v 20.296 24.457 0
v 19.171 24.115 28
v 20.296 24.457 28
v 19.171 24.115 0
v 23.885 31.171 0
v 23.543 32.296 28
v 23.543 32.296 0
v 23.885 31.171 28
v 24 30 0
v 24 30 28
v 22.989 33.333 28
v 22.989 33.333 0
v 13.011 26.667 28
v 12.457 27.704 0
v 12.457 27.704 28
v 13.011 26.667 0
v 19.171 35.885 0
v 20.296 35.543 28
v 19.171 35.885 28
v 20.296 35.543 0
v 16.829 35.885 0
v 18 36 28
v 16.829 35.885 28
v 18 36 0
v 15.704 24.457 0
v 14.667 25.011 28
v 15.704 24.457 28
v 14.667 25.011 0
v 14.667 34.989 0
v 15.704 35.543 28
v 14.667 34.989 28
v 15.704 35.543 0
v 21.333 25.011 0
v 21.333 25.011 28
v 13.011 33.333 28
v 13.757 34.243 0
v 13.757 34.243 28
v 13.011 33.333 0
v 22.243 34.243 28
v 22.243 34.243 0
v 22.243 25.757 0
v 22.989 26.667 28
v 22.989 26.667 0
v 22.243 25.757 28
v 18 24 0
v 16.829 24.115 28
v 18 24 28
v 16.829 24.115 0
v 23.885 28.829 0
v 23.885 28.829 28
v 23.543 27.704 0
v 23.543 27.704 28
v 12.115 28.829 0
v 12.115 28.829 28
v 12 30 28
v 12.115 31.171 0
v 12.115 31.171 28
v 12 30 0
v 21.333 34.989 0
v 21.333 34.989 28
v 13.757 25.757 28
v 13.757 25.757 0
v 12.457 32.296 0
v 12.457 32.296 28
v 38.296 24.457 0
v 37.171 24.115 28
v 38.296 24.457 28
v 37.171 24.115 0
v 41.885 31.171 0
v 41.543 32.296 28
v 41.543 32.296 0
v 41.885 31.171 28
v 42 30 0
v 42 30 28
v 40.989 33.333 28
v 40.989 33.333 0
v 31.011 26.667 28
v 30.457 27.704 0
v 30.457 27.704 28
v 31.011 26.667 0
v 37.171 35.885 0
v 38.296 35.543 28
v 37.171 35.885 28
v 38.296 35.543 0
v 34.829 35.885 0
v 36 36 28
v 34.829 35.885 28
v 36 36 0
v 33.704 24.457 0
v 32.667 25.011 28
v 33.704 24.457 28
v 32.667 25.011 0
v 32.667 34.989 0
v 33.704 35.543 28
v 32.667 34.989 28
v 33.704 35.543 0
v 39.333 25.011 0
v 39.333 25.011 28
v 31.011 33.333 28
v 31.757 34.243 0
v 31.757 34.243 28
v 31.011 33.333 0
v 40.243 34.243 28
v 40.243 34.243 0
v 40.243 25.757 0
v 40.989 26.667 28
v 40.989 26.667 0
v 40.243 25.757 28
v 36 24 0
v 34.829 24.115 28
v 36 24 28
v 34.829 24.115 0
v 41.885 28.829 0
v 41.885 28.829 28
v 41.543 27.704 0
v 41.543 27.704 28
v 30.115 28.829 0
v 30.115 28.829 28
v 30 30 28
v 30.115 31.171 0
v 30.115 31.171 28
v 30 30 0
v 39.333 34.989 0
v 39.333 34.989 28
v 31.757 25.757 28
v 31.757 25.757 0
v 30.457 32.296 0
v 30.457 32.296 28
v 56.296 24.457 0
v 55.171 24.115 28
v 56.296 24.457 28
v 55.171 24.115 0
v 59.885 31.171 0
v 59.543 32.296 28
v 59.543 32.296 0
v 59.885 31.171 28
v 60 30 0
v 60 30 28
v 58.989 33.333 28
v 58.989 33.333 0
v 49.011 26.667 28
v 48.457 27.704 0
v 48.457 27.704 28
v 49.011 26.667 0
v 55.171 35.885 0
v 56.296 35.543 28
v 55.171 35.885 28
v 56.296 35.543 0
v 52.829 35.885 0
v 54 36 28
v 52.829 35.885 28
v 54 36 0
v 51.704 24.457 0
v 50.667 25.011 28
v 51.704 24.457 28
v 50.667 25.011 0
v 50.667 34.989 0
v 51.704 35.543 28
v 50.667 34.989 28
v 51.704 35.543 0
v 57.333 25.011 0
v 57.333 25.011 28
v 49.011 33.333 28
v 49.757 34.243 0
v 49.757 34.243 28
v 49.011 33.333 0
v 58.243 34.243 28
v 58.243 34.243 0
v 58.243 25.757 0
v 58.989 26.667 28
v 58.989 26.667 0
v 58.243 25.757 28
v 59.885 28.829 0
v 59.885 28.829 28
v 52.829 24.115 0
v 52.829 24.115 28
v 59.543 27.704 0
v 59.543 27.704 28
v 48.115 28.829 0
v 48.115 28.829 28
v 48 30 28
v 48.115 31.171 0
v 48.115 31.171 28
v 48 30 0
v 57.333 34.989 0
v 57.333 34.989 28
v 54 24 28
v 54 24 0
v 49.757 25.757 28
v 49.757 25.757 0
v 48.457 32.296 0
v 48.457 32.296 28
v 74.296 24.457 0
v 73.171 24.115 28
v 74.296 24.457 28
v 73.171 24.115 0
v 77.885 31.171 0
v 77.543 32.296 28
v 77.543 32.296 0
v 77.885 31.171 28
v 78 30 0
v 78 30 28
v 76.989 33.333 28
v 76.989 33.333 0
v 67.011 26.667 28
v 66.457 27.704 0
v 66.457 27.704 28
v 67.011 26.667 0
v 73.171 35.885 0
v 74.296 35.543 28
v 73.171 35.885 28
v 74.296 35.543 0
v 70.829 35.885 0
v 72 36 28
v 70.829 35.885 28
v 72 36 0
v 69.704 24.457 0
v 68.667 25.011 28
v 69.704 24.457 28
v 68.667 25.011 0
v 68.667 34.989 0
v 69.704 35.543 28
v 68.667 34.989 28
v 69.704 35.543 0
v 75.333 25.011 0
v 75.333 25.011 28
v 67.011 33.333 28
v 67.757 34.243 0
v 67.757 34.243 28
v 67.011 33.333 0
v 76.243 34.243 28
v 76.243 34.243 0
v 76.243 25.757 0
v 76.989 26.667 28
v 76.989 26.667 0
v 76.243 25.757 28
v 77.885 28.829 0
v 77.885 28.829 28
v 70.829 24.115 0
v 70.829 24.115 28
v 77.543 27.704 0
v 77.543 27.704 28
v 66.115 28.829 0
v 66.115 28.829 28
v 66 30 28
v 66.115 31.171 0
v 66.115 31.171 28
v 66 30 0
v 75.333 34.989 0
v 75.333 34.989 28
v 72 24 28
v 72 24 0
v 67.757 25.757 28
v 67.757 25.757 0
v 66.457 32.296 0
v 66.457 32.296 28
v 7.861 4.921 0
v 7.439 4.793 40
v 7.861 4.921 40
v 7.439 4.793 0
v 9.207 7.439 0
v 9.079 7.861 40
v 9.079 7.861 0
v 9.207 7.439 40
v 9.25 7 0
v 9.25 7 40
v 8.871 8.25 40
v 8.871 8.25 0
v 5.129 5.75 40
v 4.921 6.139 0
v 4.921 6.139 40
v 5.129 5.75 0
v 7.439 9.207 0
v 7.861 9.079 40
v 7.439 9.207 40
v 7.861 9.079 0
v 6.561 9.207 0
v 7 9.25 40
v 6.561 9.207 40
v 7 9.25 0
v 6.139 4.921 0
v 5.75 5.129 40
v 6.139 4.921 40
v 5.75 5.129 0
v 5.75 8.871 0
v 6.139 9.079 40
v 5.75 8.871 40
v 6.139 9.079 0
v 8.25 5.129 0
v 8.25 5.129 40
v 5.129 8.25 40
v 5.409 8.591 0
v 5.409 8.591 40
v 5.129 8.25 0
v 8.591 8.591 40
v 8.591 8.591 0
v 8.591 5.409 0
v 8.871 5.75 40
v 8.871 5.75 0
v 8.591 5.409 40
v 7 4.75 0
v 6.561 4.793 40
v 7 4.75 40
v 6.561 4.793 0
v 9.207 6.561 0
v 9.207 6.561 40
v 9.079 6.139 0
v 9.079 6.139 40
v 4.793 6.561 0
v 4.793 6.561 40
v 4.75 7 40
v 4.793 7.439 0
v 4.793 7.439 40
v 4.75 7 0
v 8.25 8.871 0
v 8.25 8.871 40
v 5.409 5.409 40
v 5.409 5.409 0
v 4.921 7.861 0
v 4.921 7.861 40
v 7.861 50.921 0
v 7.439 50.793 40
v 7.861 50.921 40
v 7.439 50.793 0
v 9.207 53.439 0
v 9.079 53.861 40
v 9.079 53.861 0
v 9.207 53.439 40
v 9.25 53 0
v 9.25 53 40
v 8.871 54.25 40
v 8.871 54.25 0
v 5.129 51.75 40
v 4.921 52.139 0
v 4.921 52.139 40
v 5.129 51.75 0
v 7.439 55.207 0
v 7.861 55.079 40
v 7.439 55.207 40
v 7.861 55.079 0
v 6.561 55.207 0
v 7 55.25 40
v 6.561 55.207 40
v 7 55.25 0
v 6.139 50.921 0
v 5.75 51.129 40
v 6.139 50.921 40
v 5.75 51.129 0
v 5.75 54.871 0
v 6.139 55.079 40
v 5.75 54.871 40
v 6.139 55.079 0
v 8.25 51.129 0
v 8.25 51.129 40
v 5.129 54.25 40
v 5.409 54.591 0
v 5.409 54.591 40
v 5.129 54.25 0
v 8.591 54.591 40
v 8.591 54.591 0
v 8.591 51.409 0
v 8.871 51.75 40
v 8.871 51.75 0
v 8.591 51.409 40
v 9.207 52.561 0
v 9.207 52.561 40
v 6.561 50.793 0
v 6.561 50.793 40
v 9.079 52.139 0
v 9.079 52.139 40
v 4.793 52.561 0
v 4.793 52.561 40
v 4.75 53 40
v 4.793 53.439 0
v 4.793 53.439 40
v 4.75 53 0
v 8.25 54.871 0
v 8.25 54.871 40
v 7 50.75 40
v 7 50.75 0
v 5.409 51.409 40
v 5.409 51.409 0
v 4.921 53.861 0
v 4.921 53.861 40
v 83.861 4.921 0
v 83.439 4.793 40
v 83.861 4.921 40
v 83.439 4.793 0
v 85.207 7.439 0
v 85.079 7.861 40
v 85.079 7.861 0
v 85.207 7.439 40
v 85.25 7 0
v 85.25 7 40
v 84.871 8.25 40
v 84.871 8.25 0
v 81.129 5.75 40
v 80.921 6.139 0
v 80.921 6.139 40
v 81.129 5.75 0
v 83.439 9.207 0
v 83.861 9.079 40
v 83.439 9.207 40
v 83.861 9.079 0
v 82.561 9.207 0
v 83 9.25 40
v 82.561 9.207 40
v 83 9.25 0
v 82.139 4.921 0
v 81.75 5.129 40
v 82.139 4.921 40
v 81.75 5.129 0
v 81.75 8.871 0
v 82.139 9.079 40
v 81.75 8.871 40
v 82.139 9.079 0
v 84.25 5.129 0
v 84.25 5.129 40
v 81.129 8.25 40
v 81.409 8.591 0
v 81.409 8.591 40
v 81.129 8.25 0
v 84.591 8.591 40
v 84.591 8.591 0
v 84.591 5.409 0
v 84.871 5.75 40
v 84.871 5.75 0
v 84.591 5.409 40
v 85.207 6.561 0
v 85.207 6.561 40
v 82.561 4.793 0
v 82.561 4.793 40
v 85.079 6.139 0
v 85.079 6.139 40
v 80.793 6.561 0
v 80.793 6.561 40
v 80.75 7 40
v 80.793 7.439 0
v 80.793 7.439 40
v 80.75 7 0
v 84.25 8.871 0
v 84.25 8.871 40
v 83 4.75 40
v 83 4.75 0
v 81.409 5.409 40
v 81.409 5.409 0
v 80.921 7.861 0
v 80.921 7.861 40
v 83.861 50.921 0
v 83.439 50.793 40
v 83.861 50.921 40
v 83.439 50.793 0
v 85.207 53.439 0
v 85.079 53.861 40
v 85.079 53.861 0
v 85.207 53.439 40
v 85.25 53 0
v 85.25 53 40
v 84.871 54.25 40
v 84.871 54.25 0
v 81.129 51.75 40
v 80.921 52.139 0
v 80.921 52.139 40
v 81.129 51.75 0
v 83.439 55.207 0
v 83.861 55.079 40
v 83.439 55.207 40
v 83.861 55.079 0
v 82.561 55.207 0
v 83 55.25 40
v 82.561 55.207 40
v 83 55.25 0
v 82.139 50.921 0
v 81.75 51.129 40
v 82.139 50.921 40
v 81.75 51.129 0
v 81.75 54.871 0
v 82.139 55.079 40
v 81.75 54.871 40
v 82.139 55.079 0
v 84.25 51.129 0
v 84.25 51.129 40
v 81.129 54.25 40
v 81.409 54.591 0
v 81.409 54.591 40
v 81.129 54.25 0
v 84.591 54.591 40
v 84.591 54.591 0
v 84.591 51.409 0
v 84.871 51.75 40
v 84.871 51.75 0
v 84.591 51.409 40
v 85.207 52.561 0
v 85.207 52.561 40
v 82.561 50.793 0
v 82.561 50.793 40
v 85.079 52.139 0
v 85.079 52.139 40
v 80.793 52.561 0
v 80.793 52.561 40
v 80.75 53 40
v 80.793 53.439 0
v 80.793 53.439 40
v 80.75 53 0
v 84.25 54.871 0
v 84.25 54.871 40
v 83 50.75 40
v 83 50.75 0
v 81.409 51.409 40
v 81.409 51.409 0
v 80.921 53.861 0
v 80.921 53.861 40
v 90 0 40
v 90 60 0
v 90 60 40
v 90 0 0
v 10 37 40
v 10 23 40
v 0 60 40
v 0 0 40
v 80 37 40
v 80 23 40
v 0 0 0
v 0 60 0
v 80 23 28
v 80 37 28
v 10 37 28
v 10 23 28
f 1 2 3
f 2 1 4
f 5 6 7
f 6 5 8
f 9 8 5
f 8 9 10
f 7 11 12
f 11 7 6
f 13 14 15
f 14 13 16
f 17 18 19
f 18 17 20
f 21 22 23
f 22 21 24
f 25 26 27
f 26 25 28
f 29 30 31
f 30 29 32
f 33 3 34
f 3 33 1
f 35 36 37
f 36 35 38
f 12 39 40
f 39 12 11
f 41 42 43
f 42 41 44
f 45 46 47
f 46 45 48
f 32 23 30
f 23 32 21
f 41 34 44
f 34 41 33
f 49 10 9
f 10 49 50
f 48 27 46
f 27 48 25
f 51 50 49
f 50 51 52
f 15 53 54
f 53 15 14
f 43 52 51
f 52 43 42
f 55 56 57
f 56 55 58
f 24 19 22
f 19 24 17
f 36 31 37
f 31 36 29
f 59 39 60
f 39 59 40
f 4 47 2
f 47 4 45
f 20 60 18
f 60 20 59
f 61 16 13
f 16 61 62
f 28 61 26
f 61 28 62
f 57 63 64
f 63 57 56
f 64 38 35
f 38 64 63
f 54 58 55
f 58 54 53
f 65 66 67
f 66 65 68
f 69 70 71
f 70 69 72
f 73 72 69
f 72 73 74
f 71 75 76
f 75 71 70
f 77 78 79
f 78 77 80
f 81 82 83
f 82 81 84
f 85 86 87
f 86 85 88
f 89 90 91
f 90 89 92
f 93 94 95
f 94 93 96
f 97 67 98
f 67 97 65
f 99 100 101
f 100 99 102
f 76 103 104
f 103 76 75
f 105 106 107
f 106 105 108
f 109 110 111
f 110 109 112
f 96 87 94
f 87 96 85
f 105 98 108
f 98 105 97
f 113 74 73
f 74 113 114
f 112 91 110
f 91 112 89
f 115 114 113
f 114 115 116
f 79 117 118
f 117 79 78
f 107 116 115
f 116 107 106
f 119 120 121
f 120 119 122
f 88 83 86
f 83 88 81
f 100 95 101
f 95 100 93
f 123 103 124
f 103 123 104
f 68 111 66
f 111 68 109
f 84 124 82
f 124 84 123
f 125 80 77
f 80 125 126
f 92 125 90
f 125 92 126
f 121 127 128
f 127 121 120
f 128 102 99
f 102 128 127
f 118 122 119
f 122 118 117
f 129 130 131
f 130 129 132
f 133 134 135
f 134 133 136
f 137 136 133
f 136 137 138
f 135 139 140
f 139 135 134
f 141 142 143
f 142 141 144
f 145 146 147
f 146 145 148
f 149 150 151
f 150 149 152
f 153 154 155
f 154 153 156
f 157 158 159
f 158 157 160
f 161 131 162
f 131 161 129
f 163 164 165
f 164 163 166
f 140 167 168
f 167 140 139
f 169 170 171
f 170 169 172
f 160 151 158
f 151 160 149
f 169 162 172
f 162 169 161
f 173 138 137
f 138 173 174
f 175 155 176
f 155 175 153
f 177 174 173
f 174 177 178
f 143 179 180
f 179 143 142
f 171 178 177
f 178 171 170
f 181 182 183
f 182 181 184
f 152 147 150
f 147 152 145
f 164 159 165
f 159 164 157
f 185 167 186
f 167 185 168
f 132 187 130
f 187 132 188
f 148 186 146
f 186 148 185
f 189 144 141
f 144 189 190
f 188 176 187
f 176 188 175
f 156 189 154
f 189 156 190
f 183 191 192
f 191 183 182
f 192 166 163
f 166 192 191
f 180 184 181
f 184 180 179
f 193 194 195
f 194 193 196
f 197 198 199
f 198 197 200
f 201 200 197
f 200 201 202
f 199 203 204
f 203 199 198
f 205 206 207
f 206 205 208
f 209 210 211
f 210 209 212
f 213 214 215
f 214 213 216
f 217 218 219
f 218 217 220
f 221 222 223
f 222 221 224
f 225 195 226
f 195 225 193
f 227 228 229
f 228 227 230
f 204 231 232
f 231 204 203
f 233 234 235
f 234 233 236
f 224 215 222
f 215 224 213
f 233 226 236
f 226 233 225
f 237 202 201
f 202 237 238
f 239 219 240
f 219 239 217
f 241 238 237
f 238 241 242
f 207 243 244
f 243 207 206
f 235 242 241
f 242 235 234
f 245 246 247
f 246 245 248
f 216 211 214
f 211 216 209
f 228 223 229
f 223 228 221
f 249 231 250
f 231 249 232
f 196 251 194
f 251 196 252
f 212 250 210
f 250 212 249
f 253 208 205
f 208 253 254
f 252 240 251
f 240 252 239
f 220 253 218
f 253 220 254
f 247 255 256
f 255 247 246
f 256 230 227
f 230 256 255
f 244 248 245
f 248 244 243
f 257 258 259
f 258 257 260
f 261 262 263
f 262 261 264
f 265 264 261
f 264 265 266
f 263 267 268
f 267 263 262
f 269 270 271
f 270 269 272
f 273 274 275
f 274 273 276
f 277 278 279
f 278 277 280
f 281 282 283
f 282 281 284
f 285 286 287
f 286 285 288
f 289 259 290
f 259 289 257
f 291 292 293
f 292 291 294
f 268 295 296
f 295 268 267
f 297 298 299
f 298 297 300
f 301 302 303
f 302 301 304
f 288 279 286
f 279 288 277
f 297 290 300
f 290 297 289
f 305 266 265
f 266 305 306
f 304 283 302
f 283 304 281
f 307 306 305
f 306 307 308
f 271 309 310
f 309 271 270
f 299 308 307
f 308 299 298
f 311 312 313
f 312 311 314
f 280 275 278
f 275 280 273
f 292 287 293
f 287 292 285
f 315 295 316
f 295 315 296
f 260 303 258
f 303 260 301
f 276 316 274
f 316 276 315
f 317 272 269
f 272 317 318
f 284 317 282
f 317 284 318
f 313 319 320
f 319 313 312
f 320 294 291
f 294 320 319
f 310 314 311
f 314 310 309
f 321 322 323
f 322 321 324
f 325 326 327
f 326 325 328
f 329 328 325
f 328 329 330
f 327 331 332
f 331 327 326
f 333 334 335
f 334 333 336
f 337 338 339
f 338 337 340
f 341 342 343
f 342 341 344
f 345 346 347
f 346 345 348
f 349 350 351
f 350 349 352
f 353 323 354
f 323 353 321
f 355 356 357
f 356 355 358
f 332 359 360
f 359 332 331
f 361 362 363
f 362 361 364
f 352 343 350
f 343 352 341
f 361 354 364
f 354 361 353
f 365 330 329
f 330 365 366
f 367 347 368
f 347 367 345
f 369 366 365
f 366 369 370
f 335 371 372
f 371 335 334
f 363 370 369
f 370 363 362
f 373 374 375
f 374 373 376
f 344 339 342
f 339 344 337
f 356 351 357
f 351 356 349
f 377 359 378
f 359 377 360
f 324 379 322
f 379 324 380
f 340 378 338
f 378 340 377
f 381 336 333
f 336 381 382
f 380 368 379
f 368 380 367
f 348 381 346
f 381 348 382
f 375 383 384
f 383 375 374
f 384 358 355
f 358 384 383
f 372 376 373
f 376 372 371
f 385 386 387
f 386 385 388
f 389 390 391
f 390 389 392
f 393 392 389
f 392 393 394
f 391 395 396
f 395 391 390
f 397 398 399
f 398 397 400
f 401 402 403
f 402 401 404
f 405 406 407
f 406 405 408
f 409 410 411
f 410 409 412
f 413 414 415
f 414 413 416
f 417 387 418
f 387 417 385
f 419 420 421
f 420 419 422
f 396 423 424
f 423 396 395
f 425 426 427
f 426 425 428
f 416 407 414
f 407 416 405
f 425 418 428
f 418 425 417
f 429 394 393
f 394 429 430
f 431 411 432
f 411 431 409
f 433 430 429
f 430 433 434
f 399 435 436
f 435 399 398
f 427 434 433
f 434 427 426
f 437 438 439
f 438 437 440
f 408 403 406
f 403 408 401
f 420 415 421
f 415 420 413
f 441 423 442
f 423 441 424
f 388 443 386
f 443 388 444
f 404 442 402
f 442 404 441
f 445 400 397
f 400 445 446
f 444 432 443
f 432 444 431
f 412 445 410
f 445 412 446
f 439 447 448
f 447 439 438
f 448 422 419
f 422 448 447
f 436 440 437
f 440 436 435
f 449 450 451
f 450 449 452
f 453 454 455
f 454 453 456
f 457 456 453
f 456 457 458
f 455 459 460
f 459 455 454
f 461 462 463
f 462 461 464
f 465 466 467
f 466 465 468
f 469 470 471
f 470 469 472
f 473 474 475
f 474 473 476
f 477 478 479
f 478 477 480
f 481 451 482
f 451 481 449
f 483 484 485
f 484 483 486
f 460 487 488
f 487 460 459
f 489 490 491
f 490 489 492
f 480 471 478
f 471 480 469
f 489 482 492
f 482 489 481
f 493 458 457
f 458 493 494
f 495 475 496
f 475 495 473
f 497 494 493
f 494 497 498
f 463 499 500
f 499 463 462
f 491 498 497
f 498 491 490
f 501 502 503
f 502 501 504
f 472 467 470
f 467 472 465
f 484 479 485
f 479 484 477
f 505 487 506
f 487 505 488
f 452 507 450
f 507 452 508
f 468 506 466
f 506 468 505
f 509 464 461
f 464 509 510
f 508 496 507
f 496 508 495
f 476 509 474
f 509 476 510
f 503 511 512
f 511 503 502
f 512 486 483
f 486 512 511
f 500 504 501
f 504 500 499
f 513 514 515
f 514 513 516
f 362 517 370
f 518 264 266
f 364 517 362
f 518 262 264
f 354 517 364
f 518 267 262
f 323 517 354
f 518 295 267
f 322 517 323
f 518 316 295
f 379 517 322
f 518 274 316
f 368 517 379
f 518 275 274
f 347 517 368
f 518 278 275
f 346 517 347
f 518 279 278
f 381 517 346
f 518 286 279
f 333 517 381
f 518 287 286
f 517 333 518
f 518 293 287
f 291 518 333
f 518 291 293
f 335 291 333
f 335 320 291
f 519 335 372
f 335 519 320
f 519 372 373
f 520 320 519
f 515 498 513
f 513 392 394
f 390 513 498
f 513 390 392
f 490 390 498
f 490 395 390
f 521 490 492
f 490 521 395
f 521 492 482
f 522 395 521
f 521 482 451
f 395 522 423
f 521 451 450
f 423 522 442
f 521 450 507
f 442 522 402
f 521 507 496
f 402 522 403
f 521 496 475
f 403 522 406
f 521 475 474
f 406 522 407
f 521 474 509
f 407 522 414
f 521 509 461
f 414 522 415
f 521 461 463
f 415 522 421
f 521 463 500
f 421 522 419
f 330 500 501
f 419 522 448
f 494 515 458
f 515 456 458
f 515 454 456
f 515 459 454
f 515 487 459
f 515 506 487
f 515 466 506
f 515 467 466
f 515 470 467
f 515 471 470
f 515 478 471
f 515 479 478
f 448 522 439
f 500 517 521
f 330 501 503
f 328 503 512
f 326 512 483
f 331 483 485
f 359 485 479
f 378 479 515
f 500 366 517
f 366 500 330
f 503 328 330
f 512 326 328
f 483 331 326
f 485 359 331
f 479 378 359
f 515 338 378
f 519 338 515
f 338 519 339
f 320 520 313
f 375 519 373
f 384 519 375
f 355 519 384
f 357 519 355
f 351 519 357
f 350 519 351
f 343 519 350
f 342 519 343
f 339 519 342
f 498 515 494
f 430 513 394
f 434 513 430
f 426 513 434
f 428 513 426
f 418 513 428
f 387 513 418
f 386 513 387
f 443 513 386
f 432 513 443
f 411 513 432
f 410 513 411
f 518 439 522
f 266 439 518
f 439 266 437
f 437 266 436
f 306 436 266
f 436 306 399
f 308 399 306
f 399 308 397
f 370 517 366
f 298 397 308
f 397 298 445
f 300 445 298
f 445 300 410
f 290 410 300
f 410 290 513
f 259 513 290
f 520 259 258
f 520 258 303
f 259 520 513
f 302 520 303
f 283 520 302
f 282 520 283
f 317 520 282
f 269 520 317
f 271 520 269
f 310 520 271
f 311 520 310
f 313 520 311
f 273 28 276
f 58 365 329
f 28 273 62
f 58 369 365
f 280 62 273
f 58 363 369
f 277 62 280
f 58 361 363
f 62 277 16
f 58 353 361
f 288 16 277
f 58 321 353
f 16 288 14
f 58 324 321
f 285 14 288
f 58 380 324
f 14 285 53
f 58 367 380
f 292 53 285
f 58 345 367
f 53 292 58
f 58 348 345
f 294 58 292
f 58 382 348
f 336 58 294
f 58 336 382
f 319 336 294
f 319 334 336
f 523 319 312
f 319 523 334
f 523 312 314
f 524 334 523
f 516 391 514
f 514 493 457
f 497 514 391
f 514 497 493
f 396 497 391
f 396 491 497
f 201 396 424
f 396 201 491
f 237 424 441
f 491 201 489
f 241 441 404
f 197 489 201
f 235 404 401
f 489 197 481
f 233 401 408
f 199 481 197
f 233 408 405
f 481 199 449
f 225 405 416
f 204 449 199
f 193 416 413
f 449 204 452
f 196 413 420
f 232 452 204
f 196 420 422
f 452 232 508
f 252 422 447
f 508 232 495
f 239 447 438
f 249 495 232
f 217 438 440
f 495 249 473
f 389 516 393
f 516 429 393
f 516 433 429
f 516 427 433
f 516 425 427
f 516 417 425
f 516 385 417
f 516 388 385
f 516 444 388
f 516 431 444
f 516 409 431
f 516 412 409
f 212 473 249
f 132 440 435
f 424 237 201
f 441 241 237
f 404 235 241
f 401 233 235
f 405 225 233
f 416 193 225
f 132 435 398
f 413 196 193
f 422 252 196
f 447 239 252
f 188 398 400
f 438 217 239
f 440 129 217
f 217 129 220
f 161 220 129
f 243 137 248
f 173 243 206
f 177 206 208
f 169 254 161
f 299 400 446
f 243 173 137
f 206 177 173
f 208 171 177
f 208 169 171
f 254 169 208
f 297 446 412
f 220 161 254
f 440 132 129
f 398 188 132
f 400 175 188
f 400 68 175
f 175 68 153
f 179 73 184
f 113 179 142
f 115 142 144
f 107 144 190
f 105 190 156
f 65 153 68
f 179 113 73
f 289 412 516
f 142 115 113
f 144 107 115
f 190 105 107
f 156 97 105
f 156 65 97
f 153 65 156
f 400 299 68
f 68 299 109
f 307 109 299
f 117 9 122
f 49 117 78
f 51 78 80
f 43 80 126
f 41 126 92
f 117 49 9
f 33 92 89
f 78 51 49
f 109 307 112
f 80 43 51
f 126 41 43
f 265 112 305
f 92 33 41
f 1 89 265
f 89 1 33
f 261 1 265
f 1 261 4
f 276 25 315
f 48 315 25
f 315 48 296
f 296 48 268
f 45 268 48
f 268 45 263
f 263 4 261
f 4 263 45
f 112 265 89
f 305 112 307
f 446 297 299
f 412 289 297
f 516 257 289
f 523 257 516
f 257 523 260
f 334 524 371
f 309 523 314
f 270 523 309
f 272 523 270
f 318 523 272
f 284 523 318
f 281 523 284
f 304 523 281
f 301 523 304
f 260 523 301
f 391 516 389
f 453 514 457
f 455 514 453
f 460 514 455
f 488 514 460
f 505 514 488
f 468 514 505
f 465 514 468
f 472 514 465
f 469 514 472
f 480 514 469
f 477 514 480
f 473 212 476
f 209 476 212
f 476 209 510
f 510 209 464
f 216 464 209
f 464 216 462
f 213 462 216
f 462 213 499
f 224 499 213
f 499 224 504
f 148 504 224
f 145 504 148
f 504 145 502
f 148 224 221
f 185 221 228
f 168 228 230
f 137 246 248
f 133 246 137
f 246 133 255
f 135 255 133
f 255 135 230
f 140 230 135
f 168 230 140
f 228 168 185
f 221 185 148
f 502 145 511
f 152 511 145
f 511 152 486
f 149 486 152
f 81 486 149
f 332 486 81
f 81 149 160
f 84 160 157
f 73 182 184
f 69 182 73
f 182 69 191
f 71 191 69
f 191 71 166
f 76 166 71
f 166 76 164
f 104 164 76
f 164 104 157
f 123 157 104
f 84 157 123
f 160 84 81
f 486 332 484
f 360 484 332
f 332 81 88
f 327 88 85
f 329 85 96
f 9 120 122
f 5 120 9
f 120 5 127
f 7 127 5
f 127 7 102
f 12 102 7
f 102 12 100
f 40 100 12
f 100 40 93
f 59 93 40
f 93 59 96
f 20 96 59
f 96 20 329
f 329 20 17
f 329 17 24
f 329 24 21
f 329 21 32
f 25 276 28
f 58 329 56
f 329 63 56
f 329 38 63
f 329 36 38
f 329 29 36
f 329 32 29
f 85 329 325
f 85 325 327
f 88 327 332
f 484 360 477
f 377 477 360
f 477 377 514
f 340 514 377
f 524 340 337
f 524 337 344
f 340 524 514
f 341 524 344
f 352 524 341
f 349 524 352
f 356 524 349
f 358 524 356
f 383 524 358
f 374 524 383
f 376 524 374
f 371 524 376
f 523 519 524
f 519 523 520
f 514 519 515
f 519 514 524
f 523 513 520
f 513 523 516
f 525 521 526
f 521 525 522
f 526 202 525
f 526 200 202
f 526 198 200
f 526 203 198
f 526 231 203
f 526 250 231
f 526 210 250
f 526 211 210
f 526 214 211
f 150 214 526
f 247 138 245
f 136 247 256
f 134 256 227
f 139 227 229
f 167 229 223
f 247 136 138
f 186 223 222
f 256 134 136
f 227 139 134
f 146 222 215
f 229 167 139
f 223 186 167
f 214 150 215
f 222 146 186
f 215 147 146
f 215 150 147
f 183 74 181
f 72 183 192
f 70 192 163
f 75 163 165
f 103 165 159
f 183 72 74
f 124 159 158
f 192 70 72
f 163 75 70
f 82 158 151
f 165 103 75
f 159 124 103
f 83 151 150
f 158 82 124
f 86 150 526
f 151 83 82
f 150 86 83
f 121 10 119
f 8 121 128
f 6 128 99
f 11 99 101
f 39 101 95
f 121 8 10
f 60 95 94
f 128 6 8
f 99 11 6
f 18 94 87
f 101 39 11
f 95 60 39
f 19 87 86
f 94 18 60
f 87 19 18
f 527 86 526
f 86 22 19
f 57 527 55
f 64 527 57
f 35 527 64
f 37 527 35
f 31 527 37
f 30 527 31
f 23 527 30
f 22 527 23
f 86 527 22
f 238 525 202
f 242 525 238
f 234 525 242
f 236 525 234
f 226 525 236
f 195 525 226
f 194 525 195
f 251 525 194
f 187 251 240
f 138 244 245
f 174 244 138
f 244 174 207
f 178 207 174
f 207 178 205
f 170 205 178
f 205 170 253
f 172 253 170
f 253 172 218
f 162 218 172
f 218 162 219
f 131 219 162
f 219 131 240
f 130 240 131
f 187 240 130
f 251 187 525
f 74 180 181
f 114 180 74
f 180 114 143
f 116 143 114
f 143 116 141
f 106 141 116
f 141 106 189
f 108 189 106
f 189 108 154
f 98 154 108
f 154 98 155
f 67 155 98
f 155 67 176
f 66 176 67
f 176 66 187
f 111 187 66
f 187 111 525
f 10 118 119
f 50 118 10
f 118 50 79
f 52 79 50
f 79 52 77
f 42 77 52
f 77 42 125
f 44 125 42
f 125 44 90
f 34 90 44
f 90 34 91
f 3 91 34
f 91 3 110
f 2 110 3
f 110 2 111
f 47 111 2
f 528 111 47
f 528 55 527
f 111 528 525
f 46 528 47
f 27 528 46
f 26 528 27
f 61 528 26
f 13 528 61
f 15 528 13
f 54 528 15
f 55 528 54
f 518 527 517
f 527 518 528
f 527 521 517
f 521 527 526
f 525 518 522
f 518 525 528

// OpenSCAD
$fn = 32;

// ----------------------------------------------------------------------
// Manifold block: gallery_top manifold
// ----------------------------------------------------------------------

// --- parameters (mm) ---
block_l = 90;             // block length, X
block_w = 60;             // block width, Y
block_h = 40;             // block height, Z
port_d = 12;              // port bore diameter
port_pitch = 18;          // port pitch along X
gallery_d = 14;           // top gallery width, Y
gallery_depth = 12;       // gallery pocket depth
wall_p = 10;              // gallery end wall thickness, X
mnt_d = 4.5;              // mounting hole diameter
mnt_in = 7;               // mounting hole inset from the edges

n_ports = 4;  // ports in the row
port_x0 = (block_l - (n_ports - 1) * port_pitch) / 2;  // first port X

difference() {
  cube([block_l, block_w, block_h]);
  for (i = [0 : n_ports - 1])
    translate([port_x0 + i * port_pitch, block_w / 2, -1])
      cylinder(h = block_h + 2, d = port_d);
  translate([wall_p, block_w / 2 - gallery_d / 2, block_h - gallery_depth])
    cube([block_l - 2 * wall_p, gallery_d, gallery_depth + 1]);
  for (cx = [mnt_in, block_l - mnt_in])
    for (cy = [mnt_in, block_w - mnt_in])
      translate([cx, cy, -1]) cylinder(h = block_h + 2, d = mnt_d);
}
